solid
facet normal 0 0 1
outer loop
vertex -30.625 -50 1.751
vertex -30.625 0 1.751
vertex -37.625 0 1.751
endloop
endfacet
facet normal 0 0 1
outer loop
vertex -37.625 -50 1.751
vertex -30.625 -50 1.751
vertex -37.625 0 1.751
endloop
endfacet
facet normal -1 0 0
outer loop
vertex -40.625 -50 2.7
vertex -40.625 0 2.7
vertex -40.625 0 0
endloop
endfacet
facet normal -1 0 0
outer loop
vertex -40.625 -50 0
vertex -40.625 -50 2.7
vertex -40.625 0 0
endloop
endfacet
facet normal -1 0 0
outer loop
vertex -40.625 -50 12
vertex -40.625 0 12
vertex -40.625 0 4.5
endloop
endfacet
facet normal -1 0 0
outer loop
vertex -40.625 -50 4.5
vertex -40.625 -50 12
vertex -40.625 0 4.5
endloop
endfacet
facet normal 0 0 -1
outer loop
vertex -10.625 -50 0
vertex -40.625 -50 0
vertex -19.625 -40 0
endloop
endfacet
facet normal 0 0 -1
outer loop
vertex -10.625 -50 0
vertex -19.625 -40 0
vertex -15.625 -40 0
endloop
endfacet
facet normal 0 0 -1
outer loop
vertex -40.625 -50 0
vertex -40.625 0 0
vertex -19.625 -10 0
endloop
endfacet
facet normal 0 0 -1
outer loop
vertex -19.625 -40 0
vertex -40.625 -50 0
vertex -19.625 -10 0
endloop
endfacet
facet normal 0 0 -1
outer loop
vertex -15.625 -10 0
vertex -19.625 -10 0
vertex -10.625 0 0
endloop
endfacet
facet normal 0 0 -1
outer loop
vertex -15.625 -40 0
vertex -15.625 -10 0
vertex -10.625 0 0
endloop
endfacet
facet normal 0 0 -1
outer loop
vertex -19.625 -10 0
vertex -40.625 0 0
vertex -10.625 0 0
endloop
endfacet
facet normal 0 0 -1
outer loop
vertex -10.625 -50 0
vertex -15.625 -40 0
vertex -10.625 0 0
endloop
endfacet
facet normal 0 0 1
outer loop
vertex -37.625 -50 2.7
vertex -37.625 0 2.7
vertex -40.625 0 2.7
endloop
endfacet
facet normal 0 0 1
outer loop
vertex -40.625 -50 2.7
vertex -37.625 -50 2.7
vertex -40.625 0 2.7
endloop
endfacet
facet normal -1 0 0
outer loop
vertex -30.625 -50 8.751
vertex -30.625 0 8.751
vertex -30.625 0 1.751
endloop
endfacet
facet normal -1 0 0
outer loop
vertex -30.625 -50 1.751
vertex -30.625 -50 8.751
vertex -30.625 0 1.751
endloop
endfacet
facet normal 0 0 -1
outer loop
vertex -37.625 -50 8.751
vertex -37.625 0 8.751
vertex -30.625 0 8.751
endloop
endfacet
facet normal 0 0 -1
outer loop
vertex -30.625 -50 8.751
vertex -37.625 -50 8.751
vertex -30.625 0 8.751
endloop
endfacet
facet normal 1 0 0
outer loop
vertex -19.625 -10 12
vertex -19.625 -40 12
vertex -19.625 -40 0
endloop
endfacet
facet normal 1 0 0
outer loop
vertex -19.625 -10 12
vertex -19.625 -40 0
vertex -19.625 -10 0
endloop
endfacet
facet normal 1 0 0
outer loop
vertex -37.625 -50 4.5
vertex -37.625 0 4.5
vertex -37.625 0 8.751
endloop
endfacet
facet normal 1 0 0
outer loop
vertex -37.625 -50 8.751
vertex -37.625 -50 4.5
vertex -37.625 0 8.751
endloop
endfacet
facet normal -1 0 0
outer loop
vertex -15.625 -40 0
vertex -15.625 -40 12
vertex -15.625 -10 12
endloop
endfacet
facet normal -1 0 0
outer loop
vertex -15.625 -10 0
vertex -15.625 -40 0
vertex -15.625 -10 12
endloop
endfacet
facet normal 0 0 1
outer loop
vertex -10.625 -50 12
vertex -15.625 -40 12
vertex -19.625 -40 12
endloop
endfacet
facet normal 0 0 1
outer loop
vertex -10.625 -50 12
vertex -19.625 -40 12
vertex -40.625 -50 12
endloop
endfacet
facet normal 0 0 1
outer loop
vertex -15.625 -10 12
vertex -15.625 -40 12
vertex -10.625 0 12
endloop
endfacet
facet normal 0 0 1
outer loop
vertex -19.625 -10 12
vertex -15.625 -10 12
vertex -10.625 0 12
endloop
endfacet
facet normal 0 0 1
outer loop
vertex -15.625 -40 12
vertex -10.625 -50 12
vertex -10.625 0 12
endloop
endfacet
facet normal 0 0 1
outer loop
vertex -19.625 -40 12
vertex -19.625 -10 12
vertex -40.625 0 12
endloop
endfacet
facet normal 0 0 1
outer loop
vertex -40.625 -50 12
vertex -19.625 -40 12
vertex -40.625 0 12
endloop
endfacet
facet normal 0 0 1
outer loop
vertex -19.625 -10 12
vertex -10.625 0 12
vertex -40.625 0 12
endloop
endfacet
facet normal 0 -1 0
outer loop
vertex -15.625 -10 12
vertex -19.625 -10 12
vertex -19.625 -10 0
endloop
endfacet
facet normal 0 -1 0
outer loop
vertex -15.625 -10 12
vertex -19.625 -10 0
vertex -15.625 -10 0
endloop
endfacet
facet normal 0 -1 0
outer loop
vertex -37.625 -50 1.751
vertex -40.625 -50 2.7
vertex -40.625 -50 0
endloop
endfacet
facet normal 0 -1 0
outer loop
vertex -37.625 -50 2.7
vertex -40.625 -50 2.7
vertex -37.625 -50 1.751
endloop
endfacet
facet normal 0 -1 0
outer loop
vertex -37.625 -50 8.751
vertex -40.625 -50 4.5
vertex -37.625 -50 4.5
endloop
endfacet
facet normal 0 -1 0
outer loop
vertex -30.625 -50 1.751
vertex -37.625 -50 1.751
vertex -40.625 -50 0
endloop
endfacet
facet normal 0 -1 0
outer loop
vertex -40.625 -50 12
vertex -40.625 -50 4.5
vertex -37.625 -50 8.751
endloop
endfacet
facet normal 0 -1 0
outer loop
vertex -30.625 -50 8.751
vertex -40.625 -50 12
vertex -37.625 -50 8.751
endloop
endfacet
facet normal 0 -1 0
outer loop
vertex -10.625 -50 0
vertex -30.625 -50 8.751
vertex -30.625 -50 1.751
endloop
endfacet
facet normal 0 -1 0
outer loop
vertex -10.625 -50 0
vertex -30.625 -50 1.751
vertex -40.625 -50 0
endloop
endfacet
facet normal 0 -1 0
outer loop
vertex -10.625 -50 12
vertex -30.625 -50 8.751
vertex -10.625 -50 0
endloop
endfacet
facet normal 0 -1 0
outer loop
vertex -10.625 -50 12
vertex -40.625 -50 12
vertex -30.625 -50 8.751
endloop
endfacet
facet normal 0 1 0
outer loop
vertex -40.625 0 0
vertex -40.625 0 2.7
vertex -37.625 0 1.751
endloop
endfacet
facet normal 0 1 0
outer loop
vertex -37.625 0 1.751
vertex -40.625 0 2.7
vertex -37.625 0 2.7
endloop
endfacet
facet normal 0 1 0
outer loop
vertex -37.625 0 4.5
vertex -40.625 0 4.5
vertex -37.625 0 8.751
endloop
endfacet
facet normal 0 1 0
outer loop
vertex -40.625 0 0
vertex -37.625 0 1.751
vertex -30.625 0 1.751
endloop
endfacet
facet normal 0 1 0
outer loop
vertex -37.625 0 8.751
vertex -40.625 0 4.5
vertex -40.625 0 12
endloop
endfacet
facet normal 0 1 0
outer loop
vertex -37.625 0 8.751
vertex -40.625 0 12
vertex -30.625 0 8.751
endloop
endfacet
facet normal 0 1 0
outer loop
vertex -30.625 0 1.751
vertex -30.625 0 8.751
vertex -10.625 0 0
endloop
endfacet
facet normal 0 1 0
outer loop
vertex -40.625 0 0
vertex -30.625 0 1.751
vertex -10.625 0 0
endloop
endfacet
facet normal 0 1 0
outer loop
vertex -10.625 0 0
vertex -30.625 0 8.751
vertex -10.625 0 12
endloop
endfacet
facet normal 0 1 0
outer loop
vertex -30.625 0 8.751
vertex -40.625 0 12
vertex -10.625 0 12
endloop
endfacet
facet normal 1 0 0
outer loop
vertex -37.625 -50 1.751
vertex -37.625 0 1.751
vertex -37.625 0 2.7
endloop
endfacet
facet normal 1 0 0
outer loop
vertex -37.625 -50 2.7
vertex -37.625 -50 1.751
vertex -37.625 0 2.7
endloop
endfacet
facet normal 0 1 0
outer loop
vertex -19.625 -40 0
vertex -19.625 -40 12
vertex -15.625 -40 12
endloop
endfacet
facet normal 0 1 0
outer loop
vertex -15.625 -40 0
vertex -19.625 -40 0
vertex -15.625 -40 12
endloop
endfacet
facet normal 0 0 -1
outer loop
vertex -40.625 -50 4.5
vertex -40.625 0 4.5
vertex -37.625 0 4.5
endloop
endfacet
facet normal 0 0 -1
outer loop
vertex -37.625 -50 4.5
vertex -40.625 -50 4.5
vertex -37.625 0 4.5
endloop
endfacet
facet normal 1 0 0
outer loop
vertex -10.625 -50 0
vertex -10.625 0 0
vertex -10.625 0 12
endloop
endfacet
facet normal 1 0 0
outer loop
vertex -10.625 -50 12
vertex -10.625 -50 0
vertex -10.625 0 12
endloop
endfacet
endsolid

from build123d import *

# Parameters (mm, degrees)
F1_DEPTH = 50
F2_W     = 4
F2_H     = 30
F3_DEPTH = 25


with BuildPart() as f1:
    # F0 (on Front) → F1 (new body)
    with BuildSketch(Plane.XZ):
        Polygon((-10.624999, 12), (-40.624999, 12), (-40.624999, 4.5), (-37.624999, 4.5), (-37.624999, 8.751204), (-30.624999, 8.751204), (-30.624999, 1.751204), (-37.624999, 1.751204), (-37.624999, 2.7), (-40.624999, 2.7), (-40.624999, 0), (-10.624999, 0), align=None)
    extrude(amount=F1_DEPTH)

    # F2 (on face) → F3 (cut)
    with BuildSketch(Plane.XY.offset(12)):
        with Locations((-17.624999, -25)):
            Rectangle(F2_W, F2_H)
    extrude(amount=-F3_DEPTH, mode=Mode.SUBTRACT)


solid = f1.part
